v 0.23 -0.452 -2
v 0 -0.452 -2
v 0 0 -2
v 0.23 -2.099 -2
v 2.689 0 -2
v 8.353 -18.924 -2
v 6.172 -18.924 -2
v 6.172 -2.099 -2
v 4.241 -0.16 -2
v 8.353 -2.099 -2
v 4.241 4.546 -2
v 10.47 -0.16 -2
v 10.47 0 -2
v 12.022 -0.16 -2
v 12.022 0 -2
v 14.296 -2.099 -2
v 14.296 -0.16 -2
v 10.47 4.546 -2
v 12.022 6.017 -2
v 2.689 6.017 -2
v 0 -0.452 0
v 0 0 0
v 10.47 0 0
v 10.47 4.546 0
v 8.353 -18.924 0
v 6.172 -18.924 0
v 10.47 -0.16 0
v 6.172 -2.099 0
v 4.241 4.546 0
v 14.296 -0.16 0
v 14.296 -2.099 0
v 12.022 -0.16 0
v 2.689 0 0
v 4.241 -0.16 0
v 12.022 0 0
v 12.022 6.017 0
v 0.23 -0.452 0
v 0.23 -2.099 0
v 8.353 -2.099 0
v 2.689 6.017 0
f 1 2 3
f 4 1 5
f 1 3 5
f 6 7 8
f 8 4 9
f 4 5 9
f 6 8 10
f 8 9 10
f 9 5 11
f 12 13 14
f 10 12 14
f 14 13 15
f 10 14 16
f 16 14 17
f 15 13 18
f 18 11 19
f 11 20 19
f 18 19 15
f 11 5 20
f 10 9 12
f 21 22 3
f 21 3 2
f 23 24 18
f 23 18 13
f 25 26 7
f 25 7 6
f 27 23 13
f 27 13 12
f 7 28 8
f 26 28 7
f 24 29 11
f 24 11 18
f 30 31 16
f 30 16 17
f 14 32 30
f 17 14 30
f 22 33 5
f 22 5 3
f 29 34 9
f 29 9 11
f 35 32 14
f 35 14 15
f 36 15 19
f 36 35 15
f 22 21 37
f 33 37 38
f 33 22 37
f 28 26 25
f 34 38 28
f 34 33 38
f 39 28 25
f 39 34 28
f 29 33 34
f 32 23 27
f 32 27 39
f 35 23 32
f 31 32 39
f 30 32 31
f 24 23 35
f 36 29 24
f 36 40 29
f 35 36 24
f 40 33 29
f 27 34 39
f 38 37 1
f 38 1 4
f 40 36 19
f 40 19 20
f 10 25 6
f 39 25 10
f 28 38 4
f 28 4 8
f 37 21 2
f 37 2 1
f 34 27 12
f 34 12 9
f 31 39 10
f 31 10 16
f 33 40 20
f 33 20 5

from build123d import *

# Parameters (mm, degrees)
F0_W     = 1.5524325391
F0_H     = 0.160164271
F0_W_2   = 2.4587620781
F0_H_2   = 0.2921586143
F0_W_3   = 2.2736147407
F0_W_4   = 3.1142332609
F0_W_5   = 2.4696406052
F0_W_6   = 0.6445926557
F1_DEPTH = 2


with BuildPart() as f1:
    # F0 (on Top) → F1 (new body)
    with BuildSketch(Plane.XY):
        Polygon((2.6887415443, 0), (0, 0), (0, -0.4523228854), (0.2299794661, -0.4523228854), (0.2299794661, -0.160164271), (2.6887415443, -0.160164271), align=None)
        Polygon((2.6887415443, 6.0171082268), (2.6887415443, 0), (4.2411740834, 0), (4.2411740834, 4.546245339), (7.3554073443, 4.546245339), (7.3554073443, 6.0171082268), align=None)
        with Locations((3.4649578138, -0.0800821355)):
            Rectangle(F0_W, F0_H)
        with Locations((1.4593605052, -0.3062435782)):
            Rectangle(F0_W_2, F0_H_2)
        Polygon((2.6887415443, -0.4523228854), (0.2299794661, -0.4523228854), (0.2299794661, -2.0985626283), (6.1724845996, -2.0985626283), (6.1724845996, -18.9240246407), (8.3531827515, -18.9240246407), (8.3531827515, -2.0985626283), (14.295687885, -2.0985626283), (14.295687885, -0.4523228854), (12.0220731443, -0.4523228854), (12.0220731443, -1.9231857732), (7.3554073443, -1.9231857732), (2.6887415443, -1.9231857732), align=None)
        Polygon((12.0220731443, 6.0171082268), (7.3554073443, 6.0171082268), (7.3554073443, 4.546245339), (10.4696406052, 4.546245339), (10.4696406052, 0), (12.0220731443, 0), align=None)
        with Locations((11.2458568747, -0.0800821355)):
            Rectangle(F0_W, F0_H)
        with Locations((11.2458568747, -0.3062435782)):
            Rectangle(F0_W, F0_H_2)
        with Locations((13.1588805146, -0.3062435782)):
            Rectangle(F0_W_3, F0_H_2)
        Polygon((8, -0.4523228854), (7.3554073443, -0.4523228854), (7.3554073443, -1.9231857732), (12.0220731443, -1.9231857732), (12.0220731443, -0.4523228854), (10.4696406052, -0.4523228854), align=None)
        Polygon((4.2411740834, -0.4523228854), (2.6887415443, -0.4523228854), (2.6887415443, -1.9231857732), (7.3554073443, -1.9231857732), (7.3554073443, -0.4523228854), align=None)
        with Locations((3.4649578138, -0.3062435782)):
            Rectangle(F0_W, F0_H_2)
        with Locations((5.7982907138, -0.3062435782)):
            Rectangle(F0_W_4, F0_H_2)
        with Locations((9.2348203026, -0.3062435782)):
            Rectangle(F0_W_5, F0_H_2)
        with Locations((7.6777036721, -0.3062435782)):
            Rectangle(F0_W_6, F0_H_2)
    extrude(amount=-F1_DEPTH)


solid = f1.part
